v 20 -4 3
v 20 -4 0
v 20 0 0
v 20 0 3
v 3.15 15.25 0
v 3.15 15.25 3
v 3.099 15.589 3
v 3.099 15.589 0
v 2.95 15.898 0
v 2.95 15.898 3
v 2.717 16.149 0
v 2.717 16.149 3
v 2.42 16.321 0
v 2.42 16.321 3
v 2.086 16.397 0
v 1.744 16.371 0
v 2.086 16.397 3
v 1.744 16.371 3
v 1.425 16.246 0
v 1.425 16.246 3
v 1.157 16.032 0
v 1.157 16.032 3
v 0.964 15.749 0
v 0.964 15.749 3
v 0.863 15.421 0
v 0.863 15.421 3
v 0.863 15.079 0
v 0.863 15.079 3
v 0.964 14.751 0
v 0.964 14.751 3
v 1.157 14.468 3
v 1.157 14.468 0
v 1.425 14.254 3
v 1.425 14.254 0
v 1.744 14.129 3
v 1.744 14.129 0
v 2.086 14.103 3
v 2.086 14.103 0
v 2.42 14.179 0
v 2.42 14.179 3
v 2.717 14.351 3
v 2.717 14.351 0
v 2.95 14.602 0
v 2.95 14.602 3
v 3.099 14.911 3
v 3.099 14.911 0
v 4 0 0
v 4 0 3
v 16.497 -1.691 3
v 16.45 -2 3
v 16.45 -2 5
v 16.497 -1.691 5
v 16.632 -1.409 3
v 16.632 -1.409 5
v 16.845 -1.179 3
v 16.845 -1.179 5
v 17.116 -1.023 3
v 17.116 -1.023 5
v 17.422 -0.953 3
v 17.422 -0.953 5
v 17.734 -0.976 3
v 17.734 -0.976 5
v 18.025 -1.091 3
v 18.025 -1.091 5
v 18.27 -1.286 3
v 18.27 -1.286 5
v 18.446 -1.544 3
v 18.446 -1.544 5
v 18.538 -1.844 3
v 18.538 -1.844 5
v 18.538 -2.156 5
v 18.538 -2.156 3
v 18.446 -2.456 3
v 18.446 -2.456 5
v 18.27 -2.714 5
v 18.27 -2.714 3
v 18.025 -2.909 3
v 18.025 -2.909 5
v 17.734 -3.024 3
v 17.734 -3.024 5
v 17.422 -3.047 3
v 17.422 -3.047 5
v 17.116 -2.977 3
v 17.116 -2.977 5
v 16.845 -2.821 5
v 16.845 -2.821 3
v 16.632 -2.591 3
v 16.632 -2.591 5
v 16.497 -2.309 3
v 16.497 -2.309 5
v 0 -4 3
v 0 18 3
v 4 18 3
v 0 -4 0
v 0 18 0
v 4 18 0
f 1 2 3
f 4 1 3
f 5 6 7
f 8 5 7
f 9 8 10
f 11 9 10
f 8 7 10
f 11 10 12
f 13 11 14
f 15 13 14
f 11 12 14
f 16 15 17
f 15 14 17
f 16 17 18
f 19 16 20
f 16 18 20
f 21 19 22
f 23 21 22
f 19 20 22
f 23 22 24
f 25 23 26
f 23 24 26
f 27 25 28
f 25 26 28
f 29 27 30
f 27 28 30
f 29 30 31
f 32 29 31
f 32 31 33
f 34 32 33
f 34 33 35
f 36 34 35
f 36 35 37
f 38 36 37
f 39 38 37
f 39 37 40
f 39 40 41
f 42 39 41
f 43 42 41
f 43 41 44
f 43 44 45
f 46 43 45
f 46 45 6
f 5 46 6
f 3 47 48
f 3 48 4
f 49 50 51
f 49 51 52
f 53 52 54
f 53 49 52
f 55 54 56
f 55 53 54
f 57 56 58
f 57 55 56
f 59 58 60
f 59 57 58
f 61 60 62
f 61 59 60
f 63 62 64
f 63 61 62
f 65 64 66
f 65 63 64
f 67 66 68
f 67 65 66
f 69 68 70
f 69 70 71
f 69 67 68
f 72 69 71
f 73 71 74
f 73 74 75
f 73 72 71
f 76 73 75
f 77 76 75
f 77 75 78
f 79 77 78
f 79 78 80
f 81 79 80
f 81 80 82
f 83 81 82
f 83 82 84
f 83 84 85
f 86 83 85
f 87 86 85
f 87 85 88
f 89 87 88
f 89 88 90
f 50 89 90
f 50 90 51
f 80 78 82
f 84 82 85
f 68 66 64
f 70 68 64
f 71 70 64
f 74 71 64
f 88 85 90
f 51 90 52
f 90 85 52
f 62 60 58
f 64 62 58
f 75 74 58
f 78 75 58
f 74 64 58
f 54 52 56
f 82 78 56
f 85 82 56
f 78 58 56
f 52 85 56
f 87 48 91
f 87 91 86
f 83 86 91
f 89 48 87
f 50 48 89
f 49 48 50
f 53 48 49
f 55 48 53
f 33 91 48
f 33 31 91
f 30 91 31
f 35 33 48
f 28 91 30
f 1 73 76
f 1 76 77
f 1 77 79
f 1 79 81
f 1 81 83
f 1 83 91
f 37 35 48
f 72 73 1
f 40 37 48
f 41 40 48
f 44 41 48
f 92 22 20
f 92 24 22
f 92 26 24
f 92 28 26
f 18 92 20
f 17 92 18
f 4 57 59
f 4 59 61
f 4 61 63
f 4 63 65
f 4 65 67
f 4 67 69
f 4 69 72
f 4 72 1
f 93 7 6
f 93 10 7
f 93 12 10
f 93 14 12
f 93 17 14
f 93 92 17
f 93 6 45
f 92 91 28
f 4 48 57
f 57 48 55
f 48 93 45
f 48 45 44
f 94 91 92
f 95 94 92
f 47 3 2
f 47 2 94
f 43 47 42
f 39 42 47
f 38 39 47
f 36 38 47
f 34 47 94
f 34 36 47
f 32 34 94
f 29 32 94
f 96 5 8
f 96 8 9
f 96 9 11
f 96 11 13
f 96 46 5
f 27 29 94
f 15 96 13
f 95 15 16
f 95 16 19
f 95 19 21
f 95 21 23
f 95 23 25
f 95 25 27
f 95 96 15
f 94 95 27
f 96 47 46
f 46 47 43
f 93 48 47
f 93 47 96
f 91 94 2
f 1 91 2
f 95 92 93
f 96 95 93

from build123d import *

# Parameters (mm, degrees)
CROQUIS1_W              = 20
CROQUIS1_H              = 4
SALIENTE_EXTRUIR1_DEPTH = 3
CROQUIS5_W              = 4
CROQUIS5_H              = 18
SALIENTE_EXTRUIR2_DEPTH = 3
CROQUIS5_5_R            = 1.15
CORTAR_EXTRUIR3_DEPTH   = 28.073972741
CROQUIS3_R              = 1.05
SALIENTE_EXTRUIR4_DEPTH = 5


with BuildPart() as part:
    # Croquis1 → Saliente-Extruir1 (new body)
    with BuildSketch(Plane.XY):
        with Locations((10, -2)):
            Rectangle(CROQUIS1_W, CROQUIS1_H)
    extrude(amount=SALIENTE_EXTRUIR1_DEPTH)

    # Croquis5 → Saliente-Extruir2 (add)
    with BuildSketch(Plane.XY.offset(3)):
        with Locations((2, 9)):
            Rectangle(CROQUIS5_W, CROQUIS5_H)
    extrude(amount=-SALIENTE_EXTRUIR2_DEPTH)

    # Croquis5<5> → Cortar-Extruir3 (cut, through all)
    with BuildSketch(Plane.XY.offset(3)):
        with Locations((2, 15.25)):
            Circle(CROQUIS5_5_R)
    extrude(amount=-CORTAR_EXTRUIR3_DEPTH, mode=Mode.SUBTRACT)

    # Croquis3 → Saliente-Extruir4 (add)
    with BuildSketch(Plane(origin=(0, 0, 0), x_dir=(-1, 0, 0), z_dir=(0, 0, -1))):
        with Locations((-17.5, -2)):
            Circle(CROQUIS3_R)
    extrude(amount=-SALIENTE_EXTRUIR4_DEPTH)


solid = part.part
